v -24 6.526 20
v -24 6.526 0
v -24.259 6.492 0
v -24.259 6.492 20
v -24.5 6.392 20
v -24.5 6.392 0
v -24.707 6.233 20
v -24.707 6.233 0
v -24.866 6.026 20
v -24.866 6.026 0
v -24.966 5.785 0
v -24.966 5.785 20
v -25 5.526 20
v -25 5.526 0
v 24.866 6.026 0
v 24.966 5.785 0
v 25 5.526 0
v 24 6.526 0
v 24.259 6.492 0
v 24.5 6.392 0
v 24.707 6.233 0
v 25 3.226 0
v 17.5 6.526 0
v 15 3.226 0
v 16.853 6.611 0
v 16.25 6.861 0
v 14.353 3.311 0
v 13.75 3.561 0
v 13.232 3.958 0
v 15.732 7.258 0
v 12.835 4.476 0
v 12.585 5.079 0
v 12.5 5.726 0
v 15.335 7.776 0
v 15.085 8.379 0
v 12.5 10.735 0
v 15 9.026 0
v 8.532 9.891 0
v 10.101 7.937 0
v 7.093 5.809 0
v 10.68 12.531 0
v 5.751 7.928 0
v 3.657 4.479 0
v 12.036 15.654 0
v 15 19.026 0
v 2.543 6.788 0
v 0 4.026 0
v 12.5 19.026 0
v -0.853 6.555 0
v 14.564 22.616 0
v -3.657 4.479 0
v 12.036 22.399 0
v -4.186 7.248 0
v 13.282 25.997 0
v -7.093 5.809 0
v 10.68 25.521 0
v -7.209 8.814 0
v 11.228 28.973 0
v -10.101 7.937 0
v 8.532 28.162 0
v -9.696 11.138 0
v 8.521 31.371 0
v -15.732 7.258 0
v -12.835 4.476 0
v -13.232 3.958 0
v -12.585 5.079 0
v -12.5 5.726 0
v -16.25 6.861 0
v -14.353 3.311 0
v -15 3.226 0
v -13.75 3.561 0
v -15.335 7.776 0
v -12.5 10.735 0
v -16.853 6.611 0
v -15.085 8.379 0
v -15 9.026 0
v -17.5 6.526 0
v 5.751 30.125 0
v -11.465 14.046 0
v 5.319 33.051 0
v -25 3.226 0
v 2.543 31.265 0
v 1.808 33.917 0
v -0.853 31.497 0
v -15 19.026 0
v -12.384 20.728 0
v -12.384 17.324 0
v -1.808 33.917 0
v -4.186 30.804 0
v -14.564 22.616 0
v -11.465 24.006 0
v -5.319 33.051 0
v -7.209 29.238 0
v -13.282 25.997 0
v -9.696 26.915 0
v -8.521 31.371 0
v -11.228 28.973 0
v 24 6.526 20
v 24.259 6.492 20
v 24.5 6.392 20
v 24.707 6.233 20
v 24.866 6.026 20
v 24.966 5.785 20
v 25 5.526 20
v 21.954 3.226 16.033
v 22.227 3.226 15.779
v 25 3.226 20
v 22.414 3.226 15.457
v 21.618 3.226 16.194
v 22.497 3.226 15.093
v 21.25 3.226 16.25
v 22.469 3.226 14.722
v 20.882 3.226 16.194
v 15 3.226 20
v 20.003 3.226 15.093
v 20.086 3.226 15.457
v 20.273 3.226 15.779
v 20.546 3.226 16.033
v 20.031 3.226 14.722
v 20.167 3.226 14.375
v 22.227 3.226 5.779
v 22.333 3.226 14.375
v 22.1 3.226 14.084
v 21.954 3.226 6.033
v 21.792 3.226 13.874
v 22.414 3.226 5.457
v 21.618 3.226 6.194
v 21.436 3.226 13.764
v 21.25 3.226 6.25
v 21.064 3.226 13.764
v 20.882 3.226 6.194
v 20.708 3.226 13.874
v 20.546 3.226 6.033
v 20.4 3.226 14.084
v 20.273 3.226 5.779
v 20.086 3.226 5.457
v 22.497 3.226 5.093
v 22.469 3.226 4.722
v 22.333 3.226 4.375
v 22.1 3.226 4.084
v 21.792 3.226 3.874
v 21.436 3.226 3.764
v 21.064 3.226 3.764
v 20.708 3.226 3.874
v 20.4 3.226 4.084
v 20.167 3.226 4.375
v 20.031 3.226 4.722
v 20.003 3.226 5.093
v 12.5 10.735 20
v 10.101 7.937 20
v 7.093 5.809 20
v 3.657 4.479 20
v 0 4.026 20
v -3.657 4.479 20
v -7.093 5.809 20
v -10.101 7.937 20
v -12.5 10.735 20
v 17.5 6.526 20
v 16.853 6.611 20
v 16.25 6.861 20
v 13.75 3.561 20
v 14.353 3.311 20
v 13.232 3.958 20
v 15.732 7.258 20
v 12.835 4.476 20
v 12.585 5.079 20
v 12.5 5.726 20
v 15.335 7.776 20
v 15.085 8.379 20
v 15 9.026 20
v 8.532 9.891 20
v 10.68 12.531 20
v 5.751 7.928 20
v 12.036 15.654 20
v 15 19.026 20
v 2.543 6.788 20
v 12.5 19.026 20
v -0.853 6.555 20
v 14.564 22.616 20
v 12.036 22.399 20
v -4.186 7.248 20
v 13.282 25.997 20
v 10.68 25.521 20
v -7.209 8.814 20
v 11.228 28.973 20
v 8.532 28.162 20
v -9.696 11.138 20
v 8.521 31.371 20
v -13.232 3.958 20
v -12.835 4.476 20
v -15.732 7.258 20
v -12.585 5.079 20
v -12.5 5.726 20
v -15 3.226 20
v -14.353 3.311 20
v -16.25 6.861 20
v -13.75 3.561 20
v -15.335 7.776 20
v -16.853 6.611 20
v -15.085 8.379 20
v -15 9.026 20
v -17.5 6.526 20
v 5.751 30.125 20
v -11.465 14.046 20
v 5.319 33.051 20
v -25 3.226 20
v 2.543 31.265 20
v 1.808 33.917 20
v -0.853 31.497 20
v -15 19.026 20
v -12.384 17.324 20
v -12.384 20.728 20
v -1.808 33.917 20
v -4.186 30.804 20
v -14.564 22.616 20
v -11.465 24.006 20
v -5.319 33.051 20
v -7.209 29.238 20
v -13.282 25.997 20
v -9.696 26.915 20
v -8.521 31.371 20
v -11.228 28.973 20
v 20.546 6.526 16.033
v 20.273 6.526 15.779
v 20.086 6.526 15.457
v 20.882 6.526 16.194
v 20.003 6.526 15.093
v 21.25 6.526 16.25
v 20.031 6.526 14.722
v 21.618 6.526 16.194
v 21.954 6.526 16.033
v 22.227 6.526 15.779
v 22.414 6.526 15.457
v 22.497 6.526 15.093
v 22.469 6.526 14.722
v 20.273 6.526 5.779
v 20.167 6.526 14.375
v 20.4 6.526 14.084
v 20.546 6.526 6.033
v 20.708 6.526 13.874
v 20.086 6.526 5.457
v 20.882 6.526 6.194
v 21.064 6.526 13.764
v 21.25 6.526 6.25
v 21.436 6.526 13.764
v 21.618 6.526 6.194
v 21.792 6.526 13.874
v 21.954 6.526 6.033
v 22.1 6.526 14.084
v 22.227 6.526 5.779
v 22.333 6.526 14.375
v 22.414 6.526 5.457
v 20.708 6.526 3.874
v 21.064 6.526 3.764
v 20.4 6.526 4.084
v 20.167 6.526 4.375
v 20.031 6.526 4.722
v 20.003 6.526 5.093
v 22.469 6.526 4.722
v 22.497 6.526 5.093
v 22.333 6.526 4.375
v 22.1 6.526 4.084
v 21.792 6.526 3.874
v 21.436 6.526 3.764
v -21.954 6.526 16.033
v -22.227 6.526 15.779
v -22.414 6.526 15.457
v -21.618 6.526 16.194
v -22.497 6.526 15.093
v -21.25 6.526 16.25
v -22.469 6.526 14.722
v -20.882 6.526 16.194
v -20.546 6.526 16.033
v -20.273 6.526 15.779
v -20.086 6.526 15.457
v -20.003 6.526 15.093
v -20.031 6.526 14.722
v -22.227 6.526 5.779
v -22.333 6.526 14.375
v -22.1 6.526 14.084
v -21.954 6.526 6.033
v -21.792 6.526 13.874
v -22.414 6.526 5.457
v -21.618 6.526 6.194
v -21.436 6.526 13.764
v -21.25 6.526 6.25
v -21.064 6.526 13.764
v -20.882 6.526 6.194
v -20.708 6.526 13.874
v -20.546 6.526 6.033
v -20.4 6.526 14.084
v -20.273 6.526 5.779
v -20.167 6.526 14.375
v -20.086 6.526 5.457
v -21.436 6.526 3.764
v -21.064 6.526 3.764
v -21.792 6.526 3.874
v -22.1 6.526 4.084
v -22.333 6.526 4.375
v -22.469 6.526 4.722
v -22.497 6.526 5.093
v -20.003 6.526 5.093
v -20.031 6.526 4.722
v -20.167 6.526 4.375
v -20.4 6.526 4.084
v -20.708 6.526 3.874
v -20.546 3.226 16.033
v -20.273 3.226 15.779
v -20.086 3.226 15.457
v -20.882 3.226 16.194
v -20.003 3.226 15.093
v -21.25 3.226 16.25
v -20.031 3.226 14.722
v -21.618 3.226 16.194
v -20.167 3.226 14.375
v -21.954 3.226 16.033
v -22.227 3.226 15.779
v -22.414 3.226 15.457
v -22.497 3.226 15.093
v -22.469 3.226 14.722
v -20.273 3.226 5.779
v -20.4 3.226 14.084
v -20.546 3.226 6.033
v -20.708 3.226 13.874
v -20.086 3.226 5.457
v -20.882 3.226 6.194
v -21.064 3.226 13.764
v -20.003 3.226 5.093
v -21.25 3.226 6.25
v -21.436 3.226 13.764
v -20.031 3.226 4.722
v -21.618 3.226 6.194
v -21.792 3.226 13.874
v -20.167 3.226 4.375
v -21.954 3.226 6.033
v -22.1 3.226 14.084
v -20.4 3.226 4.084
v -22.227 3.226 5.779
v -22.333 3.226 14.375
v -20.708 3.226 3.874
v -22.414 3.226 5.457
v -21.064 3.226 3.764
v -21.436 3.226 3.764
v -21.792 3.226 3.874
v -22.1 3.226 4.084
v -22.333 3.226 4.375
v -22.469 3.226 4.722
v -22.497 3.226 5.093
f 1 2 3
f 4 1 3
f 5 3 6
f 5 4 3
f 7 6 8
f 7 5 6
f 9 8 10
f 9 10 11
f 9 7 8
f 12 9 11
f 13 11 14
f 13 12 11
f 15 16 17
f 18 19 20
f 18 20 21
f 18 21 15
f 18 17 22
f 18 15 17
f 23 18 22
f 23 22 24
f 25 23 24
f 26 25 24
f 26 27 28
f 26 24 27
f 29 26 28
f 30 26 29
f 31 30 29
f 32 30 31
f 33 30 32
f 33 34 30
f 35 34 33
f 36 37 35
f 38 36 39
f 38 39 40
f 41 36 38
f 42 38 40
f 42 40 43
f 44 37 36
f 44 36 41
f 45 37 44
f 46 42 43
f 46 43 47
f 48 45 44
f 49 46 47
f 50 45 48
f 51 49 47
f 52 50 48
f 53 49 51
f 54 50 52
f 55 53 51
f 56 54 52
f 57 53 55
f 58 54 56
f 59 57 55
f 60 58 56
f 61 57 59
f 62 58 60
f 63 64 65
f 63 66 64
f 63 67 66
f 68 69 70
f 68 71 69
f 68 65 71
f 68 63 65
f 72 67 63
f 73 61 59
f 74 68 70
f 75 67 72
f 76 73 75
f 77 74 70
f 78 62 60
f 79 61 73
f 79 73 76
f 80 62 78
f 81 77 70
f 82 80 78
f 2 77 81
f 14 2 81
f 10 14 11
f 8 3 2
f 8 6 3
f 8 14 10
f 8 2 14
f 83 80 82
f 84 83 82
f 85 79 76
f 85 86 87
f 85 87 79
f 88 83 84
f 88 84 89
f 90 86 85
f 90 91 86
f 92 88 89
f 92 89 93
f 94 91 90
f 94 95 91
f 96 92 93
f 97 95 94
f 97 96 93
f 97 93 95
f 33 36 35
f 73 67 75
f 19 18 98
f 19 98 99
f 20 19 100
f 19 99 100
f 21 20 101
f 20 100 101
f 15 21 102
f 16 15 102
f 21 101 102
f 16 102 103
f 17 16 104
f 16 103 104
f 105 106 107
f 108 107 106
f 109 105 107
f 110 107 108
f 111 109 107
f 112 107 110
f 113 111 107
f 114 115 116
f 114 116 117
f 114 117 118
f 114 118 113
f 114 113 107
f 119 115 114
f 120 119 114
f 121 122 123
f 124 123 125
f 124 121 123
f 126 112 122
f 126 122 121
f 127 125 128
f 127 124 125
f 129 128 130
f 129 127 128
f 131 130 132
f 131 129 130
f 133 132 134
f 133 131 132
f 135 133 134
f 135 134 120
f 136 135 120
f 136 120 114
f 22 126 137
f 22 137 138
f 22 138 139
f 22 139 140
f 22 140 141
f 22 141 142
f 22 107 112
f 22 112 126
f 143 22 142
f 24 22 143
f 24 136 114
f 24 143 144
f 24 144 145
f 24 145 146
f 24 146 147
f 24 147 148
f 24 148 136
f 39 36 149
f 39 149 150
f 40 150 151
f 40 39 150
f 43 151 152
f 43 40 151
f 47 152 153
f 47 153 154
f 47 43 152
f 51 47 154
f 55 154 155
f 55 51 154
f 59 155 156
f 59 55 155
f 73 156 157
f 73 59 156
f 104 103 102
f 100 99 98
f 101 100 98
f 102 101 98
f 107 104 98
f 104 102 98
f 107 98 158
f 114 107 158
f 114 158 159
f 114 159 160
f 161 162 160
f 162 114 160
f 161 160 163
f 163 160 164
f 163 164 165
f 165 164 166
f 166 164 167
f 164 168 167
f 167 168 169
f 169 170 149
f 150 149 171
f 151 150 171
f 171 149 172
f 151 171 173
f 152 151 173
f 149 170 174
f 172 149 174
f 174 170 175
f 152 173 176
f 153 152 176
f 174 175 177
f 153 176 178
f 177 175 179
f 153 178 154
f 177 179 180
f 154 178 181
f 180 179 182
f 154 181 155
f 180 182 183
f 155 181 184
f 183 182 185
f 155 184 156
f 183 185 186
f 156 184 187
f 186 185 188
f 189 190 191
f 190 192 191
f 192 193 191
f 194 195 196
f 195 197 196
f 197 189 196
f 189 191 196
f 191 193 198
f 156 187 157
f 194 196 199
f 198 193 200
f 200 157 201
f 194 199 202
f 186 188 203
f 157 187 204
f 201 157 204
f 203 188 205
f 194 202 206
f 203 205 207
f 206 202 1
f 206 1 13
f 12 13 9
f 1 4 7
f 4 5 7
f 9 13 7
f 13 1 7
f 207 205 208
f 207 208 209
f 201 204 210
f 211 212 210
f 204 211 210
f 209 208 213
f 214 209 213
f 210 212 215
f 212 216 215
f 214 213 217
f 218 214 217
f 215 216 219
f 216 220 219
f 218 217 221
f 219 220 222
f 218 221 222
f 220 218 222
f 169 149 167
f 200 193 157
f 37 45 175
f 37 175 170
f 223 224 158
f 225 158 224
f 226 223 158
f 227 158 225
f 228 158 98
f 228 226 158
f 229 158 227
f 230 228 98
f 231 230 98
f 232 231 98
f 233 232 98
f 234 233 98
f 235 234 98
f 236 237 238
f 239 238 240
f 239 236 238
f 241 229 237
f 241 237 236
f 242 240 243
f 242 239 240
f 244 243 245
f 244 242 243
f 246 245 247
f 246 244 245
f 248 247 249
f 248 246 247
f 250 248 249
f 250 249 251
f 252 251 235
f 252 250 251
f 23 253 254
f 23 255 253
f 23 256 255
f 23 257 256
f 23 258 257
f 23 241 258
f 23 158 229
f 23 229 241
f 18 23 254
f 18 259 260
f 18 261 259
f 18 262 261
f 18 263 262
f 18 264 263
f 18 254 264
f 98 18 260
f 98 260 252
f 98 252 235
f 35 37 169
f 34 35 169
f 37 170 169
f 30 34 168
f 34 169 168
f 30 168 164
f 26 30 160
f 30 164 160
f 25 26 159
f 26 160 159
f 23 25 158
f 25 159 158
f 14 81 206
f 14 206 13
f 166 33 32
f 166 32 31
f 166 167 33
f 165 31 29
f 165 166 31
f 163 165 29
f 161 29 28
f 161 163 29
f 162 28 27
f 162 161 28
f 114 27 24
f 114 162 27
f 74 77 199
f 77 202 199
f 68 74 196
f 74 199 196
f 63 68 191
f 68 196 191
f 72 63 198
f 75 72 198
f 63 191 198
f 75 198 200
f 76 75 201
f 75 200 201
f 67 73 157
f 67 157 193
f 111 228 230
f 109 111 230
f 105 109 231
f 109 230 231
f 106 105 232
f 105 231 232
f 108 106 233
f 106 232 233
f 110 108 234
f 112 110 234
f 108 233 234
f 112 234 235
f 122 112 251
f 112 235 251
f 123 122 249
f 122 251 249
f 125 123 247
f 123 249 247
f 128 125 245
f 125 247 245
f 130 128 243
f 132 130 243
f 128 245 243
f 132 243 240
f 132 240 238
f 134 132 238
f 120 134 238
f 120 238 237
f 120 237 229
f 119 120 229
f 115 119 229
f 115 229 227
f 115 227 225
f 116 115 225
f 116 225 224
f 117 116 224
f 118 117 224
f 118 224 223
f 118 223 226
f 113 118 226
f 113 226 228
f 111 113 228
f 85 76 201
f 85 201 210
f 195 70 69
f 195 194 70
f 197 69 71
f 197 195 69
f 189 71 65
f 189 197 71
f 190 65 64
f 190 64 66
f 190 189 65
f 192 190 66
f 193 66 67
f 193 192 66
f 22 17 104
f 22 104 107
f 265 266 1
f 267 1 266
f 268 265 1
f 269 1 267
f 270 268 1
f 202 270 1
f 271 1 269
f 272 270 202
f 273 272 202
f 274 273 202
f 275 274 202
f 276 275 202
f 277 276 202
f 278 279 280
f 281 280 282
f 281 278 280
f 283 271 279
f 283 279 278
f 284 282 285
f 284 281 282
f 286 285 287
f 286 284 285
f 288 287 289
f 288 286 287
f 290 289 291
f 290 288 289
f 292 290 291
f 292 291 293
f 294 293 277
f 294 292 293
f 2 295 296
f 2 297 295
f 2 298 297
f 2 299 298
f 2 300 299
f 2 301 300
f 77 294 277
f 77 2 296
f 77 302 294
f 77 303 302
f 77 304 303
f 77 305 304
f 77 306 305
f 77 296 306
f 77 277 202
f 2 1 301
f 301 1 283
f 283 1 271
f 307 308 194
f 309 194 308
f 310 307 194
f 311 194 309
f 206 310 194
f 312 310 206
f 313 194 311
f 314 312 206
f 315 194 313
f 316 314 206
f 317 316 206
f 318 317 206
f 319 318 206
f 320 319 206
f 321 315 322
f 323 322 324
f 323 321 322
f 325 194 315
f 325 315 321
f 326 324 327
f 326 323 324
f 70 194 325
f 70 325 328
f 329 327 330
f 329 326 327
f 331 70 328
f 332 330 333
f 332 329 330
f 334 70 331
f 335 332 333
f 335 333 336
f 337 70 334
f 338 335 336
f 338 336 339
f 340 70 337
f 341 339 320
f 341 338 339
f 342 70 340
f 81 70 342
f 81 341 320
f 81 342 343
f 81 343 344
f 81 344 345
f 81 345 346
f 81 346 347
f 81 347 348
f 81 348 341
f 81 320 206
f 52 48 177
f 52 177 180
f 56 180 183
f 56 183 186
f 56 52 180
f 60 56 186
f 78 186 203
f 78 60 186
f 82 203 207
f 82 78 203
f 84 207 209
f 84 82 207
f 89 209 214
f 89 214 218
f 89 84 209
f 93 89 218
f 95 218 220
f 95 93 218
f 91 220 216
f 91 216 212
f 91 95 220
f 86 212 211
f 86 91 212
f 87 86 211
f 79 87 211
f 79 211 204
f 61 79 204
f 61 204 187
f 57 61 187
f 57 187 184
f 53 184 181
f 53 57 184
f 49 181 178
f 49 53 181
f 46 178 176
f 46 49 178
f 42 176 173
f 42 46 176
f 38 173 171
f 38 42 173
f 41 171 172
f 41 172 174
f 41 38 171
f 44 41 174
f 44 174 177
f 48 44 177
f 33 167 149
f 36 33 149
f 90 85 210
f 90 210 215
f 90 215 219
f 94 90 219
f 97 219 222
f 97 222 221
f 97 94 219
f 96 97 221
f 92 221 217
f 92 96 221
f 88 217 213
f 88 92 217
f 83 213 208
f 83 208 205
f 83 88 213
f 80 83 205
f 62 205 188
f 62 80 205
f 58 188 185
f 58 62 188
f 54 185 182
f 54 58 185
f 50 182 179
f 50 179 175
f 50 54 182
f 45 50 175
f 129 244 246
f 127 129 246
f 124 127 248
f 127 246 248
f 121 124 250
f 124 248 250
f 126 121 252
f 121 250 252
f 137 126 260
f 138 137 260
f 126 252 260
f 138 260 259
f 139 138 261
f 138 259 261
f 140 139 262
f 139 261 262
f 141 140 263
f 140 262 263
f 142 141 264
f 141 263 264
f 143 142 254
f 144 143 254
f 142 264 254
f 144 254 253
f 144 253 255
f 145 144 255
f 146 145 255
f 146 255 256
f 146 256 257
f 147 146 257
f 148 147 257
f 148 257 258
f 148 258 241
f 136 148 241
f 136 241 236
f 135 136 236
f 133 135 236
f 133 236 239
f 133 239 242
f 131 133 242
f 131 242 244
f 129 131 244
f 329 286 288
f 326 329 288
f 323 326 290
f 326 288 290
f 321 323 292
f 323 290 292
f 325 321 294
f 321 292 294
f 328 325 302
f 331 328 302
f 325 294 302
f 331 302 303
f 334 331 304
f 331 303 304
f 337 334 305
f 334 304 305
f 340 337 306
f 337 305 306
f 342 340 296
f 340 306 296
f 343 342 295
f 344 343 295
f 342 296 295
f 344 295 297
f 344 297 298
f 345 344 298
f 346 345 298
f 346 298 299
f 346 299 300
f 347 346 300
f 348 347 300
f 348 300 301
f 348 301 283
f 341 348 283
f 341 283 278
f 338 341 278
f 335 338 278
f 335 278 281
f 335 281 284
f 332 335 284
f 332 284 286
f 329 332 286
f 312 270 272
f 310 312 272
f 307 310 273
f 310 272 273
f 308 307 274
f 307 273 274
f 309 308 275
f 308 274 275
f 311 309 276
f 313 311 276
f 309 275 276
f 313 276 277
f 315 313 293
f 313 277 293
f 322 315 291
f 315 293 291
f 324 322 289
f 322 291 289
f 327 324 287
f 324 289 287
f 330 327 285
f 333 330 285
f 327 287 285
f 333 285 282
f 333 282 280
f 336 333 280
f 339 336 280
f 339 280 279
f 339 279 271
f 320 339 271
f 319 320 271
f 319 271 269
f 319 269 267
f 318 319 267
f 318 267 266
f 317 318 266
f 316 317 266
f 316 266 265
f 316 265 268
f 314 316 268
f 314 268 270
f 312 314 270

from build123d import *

# Parameters (mm, degrees)
SKETCH1_R           = 12.5
BOSS_EXTRUDE1_DEPTH = 20
FILLET1_R           = 2.5
CUT_EXTRUDE1_REACH  = 44.205
SKETCH2_R           = 1.25
FILLET3_R           = 1
FILLET4_R           = 2.5


with BuildPart() as part:
    # Sketch1 → Boss-Extrude1 (new body)
    with BuildSketch(Plane.XY):
        with BuildLine():
            Line((-25, 6.526152156), (-15, 6.526152156))
            Line((-15, 6.526152156), (-15, 19.026152156))
            ThreePointArc((-15, 19.026152156), (0, 34.026152156), (15, 19.026152156))
            Line((15, 19.026152156), (15, 6.526152156))
            Line((15, 6.526152156), (25, 6.526152156))
            Line((25, 6.526152156), (25, 3.226152156))
            Line((25, 3.226152156), (12.5, 3.226152156))
            Line((12.5, 3.226152156), (12.5, 10.73459018))
            ThreePointArc((12.5, 10.73459018), (0, 4.026152156), (-12.5, 10.73459018))
            Line((-12.5, 10.73459018), (-12.5, 3.226152156))
            Line((-12.5, 3.226152156), (-25, 3.226152156))
            Line((-25, 3.226152156), (-25, 6.526152156))
        make_face()
        with Locations((0, 19.026152156)):
            Circle(SKETCH1_R, mode=Mode.SUBTRACT)
    extrude(amount=BOSS_EXTRUDE1_DEPTH)

    # Fillet1
    fillet1_edges = [part.edges().sort_by_distance(p)[0] for p in [
        (-15, 6.526152156, 10),
        (15, 6.526152156, 10),
    ]]
    fillet(fillet1_edges, radius=FILLET1_R)

    # Sketch2 → Cut-Extrude1 (cut, up to next)
    with BuildSketch(Plane(origin=(0, 6.526152156, 0), x_dir=(1, 0, 0), z_dir=(0, 1, 0)), mode=Mode.PRIVATE) as cut_extrude1_sk1:
        with Locations(Location((-21.25, -5, 0), (0, 0, 270))):
            Circle(SKETCH2_R)
    cut_extrude1_tool1 = extrude(cut_extrude1_sk1.sketch, amount=-CUT_EXTRUDE1_REACH, mode=Mode.PRIVATE) & part.part
    # Sketch2 → Cut-Extrude1 (cut, up to next)
    with BuildSketch(Plane(origin=(0, 6.526152156, 0), x_dir=(1, 0, 0), z_dir=(0, 1, 0)), mode=Mode.PRIVATE) as cut_extrude1_sk2:
        with Locations(Location((-21.25, -15, 0), (0, 0, 270))):
            Circle(SKETCH2_R)
    cut_extrude1_tool2 = extrude(cut_extrude1_sk2.sketch, amount=-CUT_EXTRUDE1_REACH, mode=Mode.PRIVATE) & part.part
    # Sketch2 → Cut-Extrude1 (cut, up to next)
    with BuildSketch(Plane(origin=(0, 6.526152156, 0), x_dir=(1, 0, 0), z_dir=(0, 1, 0)), mode=Mode.PRIVATE) as cut_extrude1_sk3:
        with Locations(Location((21.25, -5, 0), (0, 0, 270))):
            Circle(SKETCH2_R)
    cut_extrude1_tool3 = extrude(cut_extrude1_sk3.sketch, amount=-CUT_EXTRUDE1_REACH, mode=Mode.PRIVATE) & part.part
    # Sketch2 → Cut-Extrude1 (cut, up to next)
    with BuildSketch(Plane(origin=(0, 6.526152156, 0), x_dir=(1, 0, 0), z_dir=(0, 1, 0)), mode=Mode.PRIVATE) as cut_extrude1_sk4:
        with Locations(Location((21.25, -15, 0), (0, 0, 270))):
            Circle(SKETCH2_R)
    cut_extrude1_tool4 = extrude(cut_extrude1_sk4.sketch, amount=-CUT_EXTRUDE1_REACH, mode=Mode.PRIVATE) & part.part
    add(cut_extrude1_tool1.solids().sort_by_distance((-21.25, 6.526152, 5))[0], mode=Mode.SUBTRACT)
    add(cut_extrude1_tool2.solids().sort_by_distance((-21.25, 6.526152, 15))[0], mode=Mode.SUBTRACT)
    add(cut_extrude1_tool3.solids().sort_by_distance((21.25, 6.526152, 5))[0], mode=Mode.SUBTRACT)
    add(cut_extrude1_tool4.solids().sort_by_distance((21.25, 6.526152, 15))[0], mode=Mode.SUBTRACT)

    # Fillet3
    fillet3_edges = [part.edges().sort_by_distance(p)[0] for p in [
        (-25, 6.526152156, 10),
        (25, 6.526152156, 10),
    ]]
    fillet(fillet3_edges, radius=FILLET3_R)

    # Fillet4
    fillet4_edges = [part.edges().sort_by_distance(p)[0] for p in [
        (-12.5, 3.226152156, 10),
        (12.5, 3.226152156, 10),
    ]]
    fillet(fillet4_edges, radius=FILLET4_R)


solid = part.part
